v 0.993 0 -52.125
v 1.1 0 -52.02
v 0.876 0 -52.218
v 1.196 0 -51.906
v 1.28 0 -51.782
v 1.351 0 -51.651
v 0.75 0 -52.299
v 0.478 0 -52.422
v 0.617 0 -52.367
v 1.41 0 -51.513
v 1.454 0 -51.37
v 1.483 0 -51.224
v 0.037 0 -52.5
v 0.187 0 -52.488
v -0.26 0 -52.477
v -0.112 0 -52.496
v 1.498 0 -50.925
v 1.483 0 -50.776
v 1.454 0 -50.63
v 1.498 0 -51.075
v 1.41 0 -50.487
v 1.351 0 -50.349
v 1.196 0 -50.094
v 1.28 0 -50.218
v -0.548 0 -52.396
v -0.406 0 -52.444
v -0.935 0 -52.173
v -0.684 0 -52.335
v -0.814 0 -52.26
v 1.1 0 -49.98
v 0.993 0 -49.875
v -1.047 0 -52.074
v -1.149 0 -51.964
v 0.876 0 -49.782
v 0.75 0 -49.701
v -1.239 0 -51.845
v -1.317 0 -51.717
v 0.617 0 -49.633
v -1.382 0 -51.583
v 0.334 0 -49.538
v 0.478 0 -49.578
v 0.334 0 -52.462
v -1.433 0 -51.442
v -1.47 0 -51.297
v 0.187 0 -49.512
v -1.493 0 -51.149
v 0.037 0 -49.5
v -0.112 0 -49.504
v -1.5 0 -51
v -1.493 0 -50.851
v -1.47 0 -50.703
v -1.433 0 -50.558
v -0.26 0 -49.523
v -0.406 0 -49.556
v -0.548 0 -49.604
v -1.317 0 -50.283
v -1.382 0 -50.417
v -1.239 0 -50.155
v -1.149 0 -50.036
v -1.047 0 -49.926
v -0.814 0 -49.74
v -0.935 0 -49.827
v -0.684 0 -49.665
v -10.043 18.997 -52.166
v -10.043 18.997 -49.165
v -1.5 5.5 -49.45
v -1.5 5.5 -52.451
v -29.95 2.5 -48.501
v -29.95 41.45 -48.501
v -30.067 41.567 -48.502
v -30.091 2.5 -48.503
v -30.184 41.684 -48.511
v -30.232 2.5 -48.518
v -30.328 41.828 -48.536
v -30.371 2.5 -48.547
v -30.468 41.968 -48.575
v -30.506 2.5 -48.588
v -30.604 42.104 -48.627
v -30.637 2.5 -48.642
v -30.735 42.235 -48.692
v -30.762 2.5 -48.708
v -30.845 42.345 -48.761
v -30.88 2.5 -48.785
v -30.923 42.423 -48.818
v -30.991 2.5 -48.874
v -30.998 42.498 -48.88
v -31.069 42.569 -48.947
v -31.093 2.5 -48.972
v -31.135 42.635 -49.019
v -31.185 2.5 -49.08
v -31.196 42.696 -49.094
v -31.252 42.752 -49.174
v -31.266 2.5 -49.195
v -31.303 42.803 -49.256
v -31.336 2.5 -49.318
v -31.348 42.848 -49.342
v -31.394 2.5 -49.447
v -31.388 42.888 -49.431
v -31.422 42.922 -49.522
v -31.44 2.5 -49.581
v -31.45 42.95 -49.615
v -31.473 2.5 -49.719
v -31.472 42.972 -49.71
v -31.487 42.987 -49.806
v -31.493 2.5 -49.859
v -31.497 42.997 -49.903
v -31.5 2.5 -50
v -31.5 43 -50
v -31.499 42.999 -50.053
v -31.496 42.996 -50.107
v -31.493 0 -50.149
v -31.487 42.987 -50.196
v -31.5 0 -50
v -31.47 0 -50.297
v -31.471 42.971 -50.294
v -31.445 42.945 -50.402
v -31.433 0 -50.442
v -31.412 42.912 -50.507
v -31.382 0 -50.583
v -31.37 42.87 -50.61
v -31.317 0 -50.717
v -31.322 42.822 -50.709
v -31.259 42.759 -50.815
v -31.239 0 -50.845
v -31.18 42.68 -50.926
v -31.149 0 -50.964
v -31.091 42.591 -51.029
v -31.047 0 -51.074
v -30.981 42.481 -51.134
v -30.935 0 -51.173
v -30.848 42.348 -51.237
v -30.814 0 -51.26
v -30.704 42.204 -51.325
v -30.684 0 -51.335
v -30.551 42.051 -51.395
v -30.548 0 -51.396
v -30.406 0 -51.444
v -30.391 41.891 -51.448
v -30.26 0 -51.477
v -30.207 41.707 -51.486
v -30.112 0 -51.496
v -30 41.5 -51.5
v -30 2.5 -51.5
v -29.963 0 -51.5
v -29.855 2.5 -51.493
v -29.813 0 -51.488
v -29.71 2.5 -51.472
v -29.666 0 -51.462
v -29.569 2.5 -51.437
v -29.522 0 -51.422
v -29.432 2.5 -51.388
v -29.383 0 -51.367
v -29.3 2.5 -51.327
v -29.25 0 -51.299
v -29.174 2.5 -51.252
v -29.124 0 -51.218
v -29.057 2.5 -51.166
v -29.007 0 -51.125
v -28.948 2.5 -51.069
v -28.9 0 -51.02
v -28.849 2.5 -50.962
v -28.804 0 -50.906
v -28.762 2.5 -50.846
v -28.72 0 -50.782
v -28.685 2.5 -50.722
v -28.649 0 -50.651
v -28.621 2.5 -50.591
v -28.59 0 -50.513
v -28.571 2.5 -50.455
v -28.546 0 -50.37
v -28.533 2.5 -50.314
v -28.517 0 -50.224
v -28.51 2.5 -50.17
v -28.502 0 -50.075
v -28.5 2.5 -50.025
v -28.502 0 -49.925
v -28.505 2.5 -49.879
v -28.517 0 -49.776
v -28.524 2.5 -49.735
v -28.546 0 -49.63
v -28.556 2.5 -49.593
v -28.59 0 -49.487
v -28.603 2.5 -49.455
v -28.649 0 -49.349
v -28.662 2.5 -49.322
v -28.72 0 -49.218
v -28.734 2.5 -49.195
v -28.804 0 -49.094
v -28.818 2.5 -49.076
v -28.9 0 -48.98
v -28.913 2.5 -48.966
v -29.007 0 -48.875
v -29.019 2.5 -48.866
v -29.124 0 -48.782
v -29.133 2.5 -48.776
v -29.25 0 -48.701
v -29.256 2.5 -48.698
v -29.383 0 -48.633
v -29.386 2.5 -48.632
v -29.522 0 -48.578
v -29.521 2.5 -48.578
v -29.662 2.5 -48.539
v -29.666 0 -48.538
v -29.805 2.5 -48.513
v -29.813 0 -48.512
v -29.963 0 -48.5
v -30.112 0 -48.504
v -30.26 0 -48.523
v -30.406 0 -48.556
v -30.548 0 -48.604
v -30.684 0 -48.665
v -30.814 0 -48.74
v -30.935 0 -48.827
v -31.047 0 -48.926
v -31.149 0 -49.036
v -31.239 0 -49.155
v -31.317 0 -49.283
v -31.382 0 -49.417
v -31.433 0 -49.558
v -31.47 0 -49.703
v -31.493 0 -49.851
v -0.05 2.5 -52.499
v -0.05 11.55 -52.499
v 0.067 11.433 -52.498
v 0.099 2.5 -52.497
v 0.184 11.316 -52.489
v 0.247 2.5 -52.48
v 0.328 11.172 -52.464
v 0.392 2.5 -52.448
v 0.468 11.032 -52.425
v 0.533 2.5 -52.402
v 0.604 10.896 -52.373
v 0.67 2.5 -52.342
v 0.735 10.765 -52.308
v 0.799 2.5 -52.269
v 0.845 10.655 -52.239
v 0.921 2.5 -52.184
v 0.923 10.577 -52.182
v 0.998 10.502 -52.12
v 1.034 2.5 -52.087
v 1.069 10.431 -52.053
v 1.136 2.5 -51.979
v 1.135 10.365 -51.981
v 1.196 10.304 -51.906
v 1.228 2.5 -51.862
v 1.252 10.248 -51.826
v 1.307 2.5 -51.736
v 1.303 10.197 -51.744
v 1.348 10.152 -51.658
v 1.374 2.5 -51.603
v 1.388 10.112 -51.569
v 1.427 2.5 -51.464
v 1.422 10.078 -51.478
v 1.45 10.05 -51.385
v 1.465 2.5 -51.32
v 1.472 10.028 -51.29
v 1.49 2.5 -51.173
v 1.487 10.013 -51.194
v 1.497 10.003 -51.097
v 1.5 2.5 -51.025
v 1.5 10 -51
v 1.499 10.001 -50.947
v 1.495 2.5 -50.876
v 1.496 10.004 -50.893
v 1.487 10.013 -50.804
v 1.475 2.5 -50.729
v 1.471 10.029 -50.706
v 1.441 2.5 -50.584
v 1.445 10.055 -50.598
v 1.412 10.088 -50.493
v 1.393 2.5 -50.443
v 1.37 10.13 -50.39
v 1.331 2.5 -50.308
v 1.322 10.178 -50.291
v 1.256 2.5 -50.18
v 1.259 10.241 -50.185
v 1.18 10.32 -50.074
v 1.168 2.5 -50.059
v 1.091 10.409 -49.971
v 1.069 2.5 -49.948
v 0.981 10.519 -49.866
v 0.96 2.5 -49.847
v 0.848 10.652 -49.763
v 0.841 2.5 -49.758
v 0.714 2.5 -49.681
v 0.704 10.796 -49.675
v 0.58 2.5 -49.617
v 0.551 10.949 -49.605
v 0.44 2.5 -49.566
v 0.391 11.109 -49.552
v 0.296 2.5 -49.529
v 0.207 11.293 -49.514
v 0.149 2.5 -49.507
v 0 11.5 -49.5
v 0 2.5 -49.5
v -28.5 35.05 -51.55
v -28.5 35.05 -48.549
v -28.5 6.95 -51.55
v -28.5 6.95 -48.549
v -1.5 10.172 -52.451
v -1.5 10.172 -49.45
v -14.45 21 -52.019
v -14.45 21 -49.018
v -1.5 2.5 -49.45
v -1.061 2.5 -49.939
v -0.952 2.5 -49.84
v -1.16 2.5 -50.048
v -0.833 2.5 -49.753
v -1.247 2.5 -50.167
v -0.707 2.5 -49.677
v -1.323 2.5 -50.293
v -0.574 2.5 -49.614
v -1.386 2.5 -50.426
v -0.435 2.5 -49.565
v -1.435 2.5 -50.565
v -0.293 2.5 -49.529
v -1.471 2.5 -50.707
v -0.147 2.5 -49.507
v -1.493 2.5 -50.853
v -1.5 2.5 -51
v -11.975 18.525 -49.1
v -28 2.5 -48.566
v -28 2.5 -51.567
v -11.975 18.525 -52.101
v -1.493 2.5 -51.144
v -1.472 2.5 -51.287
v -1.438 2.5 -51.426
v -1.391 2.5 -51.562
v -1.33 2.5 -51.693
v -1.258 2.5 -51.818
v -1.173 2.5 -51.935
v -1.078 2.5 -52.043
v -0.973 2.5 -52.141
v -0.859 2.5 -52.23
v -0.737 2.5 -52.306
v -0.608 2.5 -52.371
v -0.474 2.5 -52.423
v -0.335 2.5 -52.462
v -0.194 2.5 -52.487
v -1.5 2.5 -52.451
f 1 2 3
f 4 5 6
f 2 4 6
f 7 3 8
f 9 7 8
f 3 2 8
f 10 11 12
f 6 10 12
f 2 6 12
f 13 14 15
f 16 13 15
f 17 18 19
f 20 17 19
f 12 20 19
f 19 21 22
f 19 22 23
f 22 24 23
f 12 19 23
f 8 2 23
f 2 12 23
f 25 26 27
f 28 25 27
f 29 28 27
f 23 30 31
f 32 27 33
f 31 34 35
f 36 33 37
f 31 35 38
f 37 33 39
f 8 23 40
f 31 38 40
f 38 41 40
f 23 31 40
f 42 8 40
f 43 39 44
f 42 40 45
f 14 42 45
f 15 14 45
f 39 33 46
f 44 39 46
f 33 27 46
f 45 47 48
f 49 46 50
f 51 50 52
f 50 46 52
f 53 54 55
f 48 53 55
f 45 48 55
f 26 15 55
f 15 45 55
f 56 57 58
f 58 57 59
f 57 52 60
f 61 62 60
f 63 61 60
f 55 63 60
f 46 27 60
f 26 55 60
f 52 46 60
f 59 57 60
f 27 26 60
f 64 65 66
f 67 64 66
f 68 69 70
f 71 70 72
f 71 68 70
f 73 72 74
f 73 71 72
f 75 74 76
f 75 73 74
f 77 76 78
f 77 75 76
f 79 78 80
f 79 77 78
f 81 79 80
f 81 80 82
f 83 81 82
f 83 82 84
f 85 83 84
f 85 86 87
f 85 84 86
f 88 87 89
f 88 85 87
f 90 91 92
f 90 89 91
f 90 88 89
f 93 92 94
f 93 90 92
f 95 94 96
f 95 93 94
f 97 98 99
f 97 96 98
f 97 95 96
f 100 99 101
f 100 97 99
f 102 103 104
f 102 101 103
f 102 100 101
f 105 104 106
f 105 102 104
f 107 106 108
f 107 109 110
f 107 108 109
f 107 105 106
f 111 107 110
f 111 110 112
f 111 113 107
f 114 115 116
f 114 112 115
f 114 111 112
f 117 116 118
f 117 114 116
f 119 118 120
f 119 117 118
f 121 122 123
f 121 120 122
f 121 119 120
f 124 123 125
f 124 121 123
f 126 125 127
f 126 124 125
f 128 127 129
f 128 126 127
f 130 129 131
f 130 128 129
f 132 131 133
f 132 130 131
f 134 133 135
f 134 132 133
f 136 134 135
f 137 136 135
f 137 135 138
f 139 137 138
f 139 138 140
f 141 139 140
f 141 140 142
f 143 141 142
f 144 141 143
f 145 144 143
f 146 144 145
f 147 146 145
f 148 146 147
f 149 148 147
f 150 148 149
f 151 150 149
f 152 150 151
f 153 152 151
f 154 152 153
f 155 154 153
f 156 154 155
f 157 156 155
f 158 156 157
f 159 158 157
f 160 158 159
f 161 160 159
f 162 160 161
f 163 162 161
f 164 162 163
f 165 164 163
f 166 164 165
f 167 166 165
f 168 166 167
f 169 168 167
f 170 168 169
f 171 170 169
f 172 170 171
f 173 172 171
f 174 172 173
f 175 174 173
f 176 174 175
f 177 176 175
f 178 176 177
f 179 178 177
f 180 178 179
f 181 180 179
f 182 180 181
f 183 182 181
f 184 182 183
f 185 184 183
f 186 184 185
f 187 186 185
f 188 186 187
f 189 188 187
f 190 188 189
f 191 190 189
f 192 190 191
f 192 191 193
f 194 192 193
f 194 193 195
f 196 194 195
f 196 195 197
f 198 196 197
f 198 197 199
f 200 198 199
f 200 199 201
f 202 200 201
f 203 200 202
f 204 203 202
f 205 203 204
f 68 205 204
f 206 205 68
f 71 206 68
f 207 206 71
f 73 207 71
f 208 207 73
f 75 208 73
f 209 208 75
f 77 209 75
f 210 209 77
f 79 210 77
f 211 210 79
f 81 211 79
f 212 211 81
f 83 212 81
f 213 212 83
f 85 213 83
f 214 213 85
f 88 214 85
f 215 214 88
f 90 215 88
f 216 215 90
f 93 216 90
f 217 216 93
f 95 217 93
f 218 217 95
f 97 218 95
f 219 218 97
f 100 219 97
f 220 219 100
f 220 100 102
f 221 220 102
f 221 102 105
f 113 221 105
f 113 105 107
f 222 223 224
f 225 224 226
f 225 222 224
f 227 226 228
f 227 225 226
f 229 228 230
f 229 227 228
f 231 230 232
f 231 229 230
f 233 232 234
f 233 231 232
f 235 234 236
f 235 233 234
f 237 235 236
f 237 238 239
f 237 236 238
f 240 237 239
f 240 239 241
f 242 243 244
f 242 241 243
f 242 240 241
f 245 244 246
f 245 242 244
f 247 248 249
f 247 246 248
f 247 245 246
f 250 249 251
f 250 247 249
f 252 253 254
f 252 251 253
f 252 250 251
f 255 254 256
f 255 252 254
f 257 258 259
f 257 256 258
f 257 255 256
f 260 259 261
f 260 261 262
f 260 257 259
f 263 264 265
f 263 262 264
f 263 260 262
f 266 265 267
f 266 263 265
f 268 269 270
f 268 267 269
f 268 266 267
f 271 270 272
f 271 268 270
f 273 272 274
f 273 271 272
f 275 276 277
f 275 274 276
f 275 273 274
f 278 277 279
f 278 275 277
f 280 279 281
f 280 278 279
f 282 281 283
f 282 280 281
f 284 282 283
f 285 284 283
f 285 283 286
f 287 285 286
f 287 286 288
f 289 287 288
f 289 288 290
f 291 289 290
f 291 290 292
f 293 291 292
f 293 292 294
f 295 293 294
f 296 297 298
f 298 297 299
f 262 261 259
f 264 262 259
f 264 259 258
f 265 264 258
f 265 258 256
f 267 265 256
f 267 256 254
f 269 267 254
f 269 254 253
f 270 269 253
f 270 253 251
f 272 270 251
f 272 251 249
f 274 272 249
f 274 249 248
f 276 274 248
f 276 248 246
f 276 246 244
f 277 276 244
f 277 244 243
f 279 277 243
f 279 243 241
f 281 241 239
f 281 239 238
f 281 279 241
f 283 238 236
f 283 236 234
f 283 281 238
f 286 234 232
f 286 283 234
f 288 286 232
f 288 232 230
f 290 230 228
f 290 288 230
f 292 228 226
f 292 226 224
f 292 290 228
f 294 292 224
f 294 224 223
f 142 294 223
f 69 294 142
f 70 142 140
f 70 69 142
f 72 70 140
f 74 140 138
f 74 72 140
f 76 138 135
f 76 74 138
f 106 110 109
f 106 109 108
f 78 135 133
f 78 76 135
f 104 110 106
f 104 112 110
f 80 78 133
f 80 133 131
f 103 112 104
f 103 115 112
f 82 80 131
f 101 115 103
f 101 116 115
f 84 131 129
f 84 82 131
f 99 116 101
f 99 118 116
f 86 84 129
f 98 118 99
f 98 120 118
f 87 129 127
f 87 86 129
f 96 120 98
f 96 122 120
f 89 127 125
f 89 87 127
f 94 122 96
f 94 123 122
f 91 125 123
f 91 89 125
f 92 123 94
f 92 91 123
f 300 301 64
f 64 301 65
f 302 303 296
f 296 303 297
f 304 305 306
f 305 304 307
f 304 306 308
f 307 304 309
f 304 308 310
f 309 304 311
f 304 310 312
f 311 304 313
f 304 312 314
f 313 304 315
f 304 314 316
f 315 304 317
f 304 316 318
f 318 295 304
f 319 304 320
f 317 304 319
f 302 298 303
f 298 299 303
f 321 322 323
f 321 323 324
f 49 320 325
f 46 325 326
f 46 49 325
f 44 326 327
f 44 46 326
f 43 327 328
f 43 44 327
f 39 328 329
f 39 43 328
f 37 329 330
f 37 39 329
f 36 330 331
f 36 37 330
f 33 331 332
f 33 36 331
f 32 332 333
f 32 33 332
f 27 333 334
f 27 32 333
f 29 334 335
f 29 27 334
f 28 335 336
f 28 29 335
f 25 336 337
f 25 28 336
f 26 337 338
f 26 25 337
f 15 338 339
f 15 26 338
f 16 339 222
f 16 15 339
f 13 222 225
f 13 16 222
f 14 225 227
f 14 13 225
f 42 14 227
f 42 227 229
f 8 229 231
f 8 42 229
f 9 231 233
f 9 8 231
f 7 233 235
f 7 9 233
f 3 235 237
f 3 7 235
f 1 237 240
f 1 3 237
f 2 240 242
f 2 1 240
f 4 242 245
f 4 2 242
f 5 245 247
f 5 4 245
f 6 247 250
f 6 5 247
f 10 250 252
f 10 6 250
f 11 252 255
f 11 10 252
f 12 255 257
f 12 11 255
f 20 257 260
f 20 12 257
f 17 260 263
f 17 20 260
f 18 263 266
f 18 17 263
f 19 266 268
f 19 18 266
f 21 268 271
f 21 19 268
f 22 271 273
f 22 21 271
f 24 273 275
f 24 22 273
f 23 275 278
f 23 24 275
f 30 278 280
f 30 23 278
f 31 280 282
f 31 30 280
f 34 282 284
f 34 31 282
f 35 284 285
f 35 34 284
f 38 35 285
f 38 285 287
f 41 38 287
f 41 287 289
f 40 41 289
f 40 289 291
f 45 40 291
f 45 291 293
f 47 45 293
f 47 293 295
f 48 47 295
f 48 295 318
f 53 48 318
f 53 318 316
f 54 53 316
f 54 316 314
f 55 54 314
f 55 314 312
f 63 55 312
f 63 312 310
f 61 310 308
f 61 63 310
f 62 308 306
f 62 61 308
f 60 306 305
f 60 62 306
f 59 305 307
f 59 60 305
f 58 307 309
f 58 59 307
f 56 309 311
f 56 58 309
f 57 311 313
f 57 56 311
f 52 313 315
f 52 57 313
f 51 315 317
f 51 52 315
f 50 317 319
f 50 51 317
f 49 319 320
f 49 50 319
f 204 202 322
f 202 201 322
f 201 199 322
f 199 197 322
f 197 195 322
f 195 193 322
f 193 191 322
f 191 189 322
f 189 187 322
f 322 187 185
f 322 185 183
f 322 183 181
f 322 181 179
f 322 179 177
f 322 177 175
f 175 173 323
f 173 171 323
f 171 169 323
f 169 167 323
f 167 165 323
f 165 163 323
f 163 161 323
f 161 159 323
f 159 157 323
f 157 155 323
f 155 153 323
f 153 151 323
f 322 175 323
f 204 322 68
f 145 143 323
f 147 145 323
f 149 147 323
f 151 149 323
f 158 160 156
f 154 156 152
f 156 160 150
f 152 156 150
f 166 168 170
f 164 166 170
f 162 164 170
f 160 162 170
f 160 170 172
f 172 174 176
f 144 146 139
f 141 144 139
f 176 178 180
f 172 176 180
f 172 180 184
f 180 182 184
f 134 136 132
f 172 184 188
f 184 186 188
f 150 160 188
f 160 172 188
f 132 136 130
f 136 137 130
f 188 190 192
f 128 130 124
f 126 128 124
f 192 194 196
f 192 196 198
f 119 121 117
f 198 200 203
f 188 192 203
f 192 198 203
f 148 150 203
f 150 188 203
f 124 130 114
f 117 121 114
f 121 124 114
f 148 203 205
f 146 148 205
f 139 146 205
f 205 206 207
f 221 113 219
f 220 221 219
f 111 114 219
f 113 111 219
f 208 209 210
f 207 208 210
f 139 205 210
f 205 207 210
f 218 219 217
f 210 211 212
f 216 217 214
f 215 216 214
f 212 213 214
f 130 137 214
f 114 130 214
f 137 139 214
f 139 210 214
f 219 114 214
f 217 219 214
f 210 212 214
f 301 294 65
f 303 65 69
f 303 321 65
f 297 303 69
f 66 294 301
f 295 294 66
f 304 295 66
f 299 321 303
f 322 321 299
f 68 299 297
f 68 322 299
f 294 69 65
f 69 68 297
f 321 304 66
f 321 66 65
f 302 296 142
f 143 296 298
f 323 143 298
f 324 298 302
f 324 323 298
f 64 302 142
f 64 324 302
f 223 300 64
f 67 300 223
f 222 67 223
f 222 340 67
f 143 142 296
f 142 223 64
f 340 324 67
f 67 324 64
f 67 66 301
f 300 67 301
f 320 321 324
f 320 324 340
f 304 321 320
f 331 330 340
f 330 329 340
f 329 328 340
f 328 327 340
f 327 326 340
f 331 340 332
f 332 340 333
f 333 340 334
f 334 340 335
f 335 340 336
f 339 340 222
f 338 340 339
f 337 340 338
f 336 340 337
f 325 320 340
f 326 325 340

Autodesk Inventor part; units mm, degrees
ref_plane "YZ Plane" through (0, 0, 0) normal (1, 0, 0) x (0, 1, 0)
ref_plane "XZ Plane" through (0, 0, 0) normal (0, 1, 0) x (-1, 0, 0)
sketch "Sketch1" plane through (0, 0, 0) normal (0, 1, 0) x (-1, 0, 0)
  circle A0 centre (0, 0) radius 1.5
  circle A1 centre (0, -51) radius 1.5
  circle A2 centre (30, -1) radius 1.5
  circle A3 centre (30, -50) radius 1.5
  dimension "d0" = 3
  dimension "d1" = 3
  dimension "d2" = 3
  dimension "d3" = 3
  dimension "d5" = 49
  dimension "d6" = 1
  dimension "d7" = 30
  dimension "d8" = 51
extrude "Extrusion1" add sketch "Sketch1" along normal blind 2.5
sketch "Sketch2" plane through (-30, 2.5, -1) normal (0, 1, 0) x (1, 0, 0)
  circle A0 centre (0, 0) radius 1.5 projected
  line L0 (0, -1.5) -> (30, -2.5)
  circle A1 centre (30, -1) radius 1.5 projected
  line L1 (30, 0.5) -> (0, 1.5)
  circle A2 centre (0, 49) radius 1.5 projected
  circle A3 centre (30, 50) radius 1.5 projected
  line L2 (0, 50.5) -> (29.95, 51.4992)
  line L3 (30, 48.5) -> (0.05, 47.5008)
extrude "Extrusion2" add sketch "Sketch2" along normal blind 45
ref_plane "Work Plane1" through (0, 0, 2) normal (0, 0, 1) x (1, 0, 0)
sketch "Sketch3" plane through (0, 0, 2) normal (0, 0, 1) x (1, 0, 0)
  line L0 (1.5, 0) -> (1.5, 47.5) projected
  line L1 (1.5, 10) -> (-31.5, 43)
  line L2 (-31.5, 0) -> (-31.5, 47.5) projected
  line L3 (1.5, 0) -> (-1.5, 0) projected
  line L4 (-31.5, 43) -> (-31.5, 47.5)
  line L5 (-31.5, 0) -> (-31.5, 47.5) projected
  line L6 (1.5, 47.5) -> (1.5, 10)
  line L7 (1.5, 47.5) -> (-31.5, 47.5)
  line L8 (0, 2.5) -> (-29.9001, 2.5) projected
  line L9 (-1.5, 2.5) -> (-28, 2.5)
  line L10 (-28, 2.5) -> (-11.9749, 18.5251)
  line L11 (-11.9749, 18.5251) -> (-1.5, 2.5)
  line L12 (-28.5, 6.9497) -> (-14.4497, 21)
  line L13 (-14.4497, 21) -> (-28.5, 35.0503)
  line L14 (-31.5, 0) -> (-31.5, 47.5) projected
  line L15 (-10.0429, 18.9973) -> (-1.5, 5.5)
  line L16 (-1.5, 5.5) -> (-1.5, 10.1716)
  line L17 (-1.5, 10.1716) -> (-10.0429, 18.9973)
  line L18 (-28.5, 35.0503) -> (-28.5, 6.9497)
  point P0 (0, 0)
  point P1 (-15, 26.5)
  point P2 (-31.5, 38.0503)
  point P3 (-31.5, 3.9497)
  dimension "d14" = 45
  dimension "d15" = 10
  dimension "d18" = 3.5
  dimension "d19" = 3.5
  dimension "d20" = 3.5
  dimension "d21" = 3.5
  dimension "d22" = 45
  dimension "d23" = 3
  dimension "d24" = 1.8
  dimension "d25" = 3
  dimension "d26" = 2
  dimension "d27" = 12.2831
  dimension "d28" = 3
extrude "Extrusion3" cut sketch "Sketch3" against normal through all
sketch "Sketch4" plane through (0, 0, 2) normal (0, 0, 1) x (1, 0, 0)
  line L0 (1.5, 0) -> (-1.5, 0) projected
  line L1 (-31.5, 0) -> (-31.5, 43) projected
  line L2 (1.5, 0) -> (-31.5, 0)
  line L3 (-31.5, 0) -> (-31.5, 43)
  line L4 (-31.5, 43) -> (1.5, 43)
  line L5 (1.5, 43) -> (1.5, 0)
  point P0 (0, 0)
  dimension "d29" = 43
extrude "Extrusion4" cut sketch "Sketch4" against normal blind 10
properties part number "ControlPanel_Middle"
